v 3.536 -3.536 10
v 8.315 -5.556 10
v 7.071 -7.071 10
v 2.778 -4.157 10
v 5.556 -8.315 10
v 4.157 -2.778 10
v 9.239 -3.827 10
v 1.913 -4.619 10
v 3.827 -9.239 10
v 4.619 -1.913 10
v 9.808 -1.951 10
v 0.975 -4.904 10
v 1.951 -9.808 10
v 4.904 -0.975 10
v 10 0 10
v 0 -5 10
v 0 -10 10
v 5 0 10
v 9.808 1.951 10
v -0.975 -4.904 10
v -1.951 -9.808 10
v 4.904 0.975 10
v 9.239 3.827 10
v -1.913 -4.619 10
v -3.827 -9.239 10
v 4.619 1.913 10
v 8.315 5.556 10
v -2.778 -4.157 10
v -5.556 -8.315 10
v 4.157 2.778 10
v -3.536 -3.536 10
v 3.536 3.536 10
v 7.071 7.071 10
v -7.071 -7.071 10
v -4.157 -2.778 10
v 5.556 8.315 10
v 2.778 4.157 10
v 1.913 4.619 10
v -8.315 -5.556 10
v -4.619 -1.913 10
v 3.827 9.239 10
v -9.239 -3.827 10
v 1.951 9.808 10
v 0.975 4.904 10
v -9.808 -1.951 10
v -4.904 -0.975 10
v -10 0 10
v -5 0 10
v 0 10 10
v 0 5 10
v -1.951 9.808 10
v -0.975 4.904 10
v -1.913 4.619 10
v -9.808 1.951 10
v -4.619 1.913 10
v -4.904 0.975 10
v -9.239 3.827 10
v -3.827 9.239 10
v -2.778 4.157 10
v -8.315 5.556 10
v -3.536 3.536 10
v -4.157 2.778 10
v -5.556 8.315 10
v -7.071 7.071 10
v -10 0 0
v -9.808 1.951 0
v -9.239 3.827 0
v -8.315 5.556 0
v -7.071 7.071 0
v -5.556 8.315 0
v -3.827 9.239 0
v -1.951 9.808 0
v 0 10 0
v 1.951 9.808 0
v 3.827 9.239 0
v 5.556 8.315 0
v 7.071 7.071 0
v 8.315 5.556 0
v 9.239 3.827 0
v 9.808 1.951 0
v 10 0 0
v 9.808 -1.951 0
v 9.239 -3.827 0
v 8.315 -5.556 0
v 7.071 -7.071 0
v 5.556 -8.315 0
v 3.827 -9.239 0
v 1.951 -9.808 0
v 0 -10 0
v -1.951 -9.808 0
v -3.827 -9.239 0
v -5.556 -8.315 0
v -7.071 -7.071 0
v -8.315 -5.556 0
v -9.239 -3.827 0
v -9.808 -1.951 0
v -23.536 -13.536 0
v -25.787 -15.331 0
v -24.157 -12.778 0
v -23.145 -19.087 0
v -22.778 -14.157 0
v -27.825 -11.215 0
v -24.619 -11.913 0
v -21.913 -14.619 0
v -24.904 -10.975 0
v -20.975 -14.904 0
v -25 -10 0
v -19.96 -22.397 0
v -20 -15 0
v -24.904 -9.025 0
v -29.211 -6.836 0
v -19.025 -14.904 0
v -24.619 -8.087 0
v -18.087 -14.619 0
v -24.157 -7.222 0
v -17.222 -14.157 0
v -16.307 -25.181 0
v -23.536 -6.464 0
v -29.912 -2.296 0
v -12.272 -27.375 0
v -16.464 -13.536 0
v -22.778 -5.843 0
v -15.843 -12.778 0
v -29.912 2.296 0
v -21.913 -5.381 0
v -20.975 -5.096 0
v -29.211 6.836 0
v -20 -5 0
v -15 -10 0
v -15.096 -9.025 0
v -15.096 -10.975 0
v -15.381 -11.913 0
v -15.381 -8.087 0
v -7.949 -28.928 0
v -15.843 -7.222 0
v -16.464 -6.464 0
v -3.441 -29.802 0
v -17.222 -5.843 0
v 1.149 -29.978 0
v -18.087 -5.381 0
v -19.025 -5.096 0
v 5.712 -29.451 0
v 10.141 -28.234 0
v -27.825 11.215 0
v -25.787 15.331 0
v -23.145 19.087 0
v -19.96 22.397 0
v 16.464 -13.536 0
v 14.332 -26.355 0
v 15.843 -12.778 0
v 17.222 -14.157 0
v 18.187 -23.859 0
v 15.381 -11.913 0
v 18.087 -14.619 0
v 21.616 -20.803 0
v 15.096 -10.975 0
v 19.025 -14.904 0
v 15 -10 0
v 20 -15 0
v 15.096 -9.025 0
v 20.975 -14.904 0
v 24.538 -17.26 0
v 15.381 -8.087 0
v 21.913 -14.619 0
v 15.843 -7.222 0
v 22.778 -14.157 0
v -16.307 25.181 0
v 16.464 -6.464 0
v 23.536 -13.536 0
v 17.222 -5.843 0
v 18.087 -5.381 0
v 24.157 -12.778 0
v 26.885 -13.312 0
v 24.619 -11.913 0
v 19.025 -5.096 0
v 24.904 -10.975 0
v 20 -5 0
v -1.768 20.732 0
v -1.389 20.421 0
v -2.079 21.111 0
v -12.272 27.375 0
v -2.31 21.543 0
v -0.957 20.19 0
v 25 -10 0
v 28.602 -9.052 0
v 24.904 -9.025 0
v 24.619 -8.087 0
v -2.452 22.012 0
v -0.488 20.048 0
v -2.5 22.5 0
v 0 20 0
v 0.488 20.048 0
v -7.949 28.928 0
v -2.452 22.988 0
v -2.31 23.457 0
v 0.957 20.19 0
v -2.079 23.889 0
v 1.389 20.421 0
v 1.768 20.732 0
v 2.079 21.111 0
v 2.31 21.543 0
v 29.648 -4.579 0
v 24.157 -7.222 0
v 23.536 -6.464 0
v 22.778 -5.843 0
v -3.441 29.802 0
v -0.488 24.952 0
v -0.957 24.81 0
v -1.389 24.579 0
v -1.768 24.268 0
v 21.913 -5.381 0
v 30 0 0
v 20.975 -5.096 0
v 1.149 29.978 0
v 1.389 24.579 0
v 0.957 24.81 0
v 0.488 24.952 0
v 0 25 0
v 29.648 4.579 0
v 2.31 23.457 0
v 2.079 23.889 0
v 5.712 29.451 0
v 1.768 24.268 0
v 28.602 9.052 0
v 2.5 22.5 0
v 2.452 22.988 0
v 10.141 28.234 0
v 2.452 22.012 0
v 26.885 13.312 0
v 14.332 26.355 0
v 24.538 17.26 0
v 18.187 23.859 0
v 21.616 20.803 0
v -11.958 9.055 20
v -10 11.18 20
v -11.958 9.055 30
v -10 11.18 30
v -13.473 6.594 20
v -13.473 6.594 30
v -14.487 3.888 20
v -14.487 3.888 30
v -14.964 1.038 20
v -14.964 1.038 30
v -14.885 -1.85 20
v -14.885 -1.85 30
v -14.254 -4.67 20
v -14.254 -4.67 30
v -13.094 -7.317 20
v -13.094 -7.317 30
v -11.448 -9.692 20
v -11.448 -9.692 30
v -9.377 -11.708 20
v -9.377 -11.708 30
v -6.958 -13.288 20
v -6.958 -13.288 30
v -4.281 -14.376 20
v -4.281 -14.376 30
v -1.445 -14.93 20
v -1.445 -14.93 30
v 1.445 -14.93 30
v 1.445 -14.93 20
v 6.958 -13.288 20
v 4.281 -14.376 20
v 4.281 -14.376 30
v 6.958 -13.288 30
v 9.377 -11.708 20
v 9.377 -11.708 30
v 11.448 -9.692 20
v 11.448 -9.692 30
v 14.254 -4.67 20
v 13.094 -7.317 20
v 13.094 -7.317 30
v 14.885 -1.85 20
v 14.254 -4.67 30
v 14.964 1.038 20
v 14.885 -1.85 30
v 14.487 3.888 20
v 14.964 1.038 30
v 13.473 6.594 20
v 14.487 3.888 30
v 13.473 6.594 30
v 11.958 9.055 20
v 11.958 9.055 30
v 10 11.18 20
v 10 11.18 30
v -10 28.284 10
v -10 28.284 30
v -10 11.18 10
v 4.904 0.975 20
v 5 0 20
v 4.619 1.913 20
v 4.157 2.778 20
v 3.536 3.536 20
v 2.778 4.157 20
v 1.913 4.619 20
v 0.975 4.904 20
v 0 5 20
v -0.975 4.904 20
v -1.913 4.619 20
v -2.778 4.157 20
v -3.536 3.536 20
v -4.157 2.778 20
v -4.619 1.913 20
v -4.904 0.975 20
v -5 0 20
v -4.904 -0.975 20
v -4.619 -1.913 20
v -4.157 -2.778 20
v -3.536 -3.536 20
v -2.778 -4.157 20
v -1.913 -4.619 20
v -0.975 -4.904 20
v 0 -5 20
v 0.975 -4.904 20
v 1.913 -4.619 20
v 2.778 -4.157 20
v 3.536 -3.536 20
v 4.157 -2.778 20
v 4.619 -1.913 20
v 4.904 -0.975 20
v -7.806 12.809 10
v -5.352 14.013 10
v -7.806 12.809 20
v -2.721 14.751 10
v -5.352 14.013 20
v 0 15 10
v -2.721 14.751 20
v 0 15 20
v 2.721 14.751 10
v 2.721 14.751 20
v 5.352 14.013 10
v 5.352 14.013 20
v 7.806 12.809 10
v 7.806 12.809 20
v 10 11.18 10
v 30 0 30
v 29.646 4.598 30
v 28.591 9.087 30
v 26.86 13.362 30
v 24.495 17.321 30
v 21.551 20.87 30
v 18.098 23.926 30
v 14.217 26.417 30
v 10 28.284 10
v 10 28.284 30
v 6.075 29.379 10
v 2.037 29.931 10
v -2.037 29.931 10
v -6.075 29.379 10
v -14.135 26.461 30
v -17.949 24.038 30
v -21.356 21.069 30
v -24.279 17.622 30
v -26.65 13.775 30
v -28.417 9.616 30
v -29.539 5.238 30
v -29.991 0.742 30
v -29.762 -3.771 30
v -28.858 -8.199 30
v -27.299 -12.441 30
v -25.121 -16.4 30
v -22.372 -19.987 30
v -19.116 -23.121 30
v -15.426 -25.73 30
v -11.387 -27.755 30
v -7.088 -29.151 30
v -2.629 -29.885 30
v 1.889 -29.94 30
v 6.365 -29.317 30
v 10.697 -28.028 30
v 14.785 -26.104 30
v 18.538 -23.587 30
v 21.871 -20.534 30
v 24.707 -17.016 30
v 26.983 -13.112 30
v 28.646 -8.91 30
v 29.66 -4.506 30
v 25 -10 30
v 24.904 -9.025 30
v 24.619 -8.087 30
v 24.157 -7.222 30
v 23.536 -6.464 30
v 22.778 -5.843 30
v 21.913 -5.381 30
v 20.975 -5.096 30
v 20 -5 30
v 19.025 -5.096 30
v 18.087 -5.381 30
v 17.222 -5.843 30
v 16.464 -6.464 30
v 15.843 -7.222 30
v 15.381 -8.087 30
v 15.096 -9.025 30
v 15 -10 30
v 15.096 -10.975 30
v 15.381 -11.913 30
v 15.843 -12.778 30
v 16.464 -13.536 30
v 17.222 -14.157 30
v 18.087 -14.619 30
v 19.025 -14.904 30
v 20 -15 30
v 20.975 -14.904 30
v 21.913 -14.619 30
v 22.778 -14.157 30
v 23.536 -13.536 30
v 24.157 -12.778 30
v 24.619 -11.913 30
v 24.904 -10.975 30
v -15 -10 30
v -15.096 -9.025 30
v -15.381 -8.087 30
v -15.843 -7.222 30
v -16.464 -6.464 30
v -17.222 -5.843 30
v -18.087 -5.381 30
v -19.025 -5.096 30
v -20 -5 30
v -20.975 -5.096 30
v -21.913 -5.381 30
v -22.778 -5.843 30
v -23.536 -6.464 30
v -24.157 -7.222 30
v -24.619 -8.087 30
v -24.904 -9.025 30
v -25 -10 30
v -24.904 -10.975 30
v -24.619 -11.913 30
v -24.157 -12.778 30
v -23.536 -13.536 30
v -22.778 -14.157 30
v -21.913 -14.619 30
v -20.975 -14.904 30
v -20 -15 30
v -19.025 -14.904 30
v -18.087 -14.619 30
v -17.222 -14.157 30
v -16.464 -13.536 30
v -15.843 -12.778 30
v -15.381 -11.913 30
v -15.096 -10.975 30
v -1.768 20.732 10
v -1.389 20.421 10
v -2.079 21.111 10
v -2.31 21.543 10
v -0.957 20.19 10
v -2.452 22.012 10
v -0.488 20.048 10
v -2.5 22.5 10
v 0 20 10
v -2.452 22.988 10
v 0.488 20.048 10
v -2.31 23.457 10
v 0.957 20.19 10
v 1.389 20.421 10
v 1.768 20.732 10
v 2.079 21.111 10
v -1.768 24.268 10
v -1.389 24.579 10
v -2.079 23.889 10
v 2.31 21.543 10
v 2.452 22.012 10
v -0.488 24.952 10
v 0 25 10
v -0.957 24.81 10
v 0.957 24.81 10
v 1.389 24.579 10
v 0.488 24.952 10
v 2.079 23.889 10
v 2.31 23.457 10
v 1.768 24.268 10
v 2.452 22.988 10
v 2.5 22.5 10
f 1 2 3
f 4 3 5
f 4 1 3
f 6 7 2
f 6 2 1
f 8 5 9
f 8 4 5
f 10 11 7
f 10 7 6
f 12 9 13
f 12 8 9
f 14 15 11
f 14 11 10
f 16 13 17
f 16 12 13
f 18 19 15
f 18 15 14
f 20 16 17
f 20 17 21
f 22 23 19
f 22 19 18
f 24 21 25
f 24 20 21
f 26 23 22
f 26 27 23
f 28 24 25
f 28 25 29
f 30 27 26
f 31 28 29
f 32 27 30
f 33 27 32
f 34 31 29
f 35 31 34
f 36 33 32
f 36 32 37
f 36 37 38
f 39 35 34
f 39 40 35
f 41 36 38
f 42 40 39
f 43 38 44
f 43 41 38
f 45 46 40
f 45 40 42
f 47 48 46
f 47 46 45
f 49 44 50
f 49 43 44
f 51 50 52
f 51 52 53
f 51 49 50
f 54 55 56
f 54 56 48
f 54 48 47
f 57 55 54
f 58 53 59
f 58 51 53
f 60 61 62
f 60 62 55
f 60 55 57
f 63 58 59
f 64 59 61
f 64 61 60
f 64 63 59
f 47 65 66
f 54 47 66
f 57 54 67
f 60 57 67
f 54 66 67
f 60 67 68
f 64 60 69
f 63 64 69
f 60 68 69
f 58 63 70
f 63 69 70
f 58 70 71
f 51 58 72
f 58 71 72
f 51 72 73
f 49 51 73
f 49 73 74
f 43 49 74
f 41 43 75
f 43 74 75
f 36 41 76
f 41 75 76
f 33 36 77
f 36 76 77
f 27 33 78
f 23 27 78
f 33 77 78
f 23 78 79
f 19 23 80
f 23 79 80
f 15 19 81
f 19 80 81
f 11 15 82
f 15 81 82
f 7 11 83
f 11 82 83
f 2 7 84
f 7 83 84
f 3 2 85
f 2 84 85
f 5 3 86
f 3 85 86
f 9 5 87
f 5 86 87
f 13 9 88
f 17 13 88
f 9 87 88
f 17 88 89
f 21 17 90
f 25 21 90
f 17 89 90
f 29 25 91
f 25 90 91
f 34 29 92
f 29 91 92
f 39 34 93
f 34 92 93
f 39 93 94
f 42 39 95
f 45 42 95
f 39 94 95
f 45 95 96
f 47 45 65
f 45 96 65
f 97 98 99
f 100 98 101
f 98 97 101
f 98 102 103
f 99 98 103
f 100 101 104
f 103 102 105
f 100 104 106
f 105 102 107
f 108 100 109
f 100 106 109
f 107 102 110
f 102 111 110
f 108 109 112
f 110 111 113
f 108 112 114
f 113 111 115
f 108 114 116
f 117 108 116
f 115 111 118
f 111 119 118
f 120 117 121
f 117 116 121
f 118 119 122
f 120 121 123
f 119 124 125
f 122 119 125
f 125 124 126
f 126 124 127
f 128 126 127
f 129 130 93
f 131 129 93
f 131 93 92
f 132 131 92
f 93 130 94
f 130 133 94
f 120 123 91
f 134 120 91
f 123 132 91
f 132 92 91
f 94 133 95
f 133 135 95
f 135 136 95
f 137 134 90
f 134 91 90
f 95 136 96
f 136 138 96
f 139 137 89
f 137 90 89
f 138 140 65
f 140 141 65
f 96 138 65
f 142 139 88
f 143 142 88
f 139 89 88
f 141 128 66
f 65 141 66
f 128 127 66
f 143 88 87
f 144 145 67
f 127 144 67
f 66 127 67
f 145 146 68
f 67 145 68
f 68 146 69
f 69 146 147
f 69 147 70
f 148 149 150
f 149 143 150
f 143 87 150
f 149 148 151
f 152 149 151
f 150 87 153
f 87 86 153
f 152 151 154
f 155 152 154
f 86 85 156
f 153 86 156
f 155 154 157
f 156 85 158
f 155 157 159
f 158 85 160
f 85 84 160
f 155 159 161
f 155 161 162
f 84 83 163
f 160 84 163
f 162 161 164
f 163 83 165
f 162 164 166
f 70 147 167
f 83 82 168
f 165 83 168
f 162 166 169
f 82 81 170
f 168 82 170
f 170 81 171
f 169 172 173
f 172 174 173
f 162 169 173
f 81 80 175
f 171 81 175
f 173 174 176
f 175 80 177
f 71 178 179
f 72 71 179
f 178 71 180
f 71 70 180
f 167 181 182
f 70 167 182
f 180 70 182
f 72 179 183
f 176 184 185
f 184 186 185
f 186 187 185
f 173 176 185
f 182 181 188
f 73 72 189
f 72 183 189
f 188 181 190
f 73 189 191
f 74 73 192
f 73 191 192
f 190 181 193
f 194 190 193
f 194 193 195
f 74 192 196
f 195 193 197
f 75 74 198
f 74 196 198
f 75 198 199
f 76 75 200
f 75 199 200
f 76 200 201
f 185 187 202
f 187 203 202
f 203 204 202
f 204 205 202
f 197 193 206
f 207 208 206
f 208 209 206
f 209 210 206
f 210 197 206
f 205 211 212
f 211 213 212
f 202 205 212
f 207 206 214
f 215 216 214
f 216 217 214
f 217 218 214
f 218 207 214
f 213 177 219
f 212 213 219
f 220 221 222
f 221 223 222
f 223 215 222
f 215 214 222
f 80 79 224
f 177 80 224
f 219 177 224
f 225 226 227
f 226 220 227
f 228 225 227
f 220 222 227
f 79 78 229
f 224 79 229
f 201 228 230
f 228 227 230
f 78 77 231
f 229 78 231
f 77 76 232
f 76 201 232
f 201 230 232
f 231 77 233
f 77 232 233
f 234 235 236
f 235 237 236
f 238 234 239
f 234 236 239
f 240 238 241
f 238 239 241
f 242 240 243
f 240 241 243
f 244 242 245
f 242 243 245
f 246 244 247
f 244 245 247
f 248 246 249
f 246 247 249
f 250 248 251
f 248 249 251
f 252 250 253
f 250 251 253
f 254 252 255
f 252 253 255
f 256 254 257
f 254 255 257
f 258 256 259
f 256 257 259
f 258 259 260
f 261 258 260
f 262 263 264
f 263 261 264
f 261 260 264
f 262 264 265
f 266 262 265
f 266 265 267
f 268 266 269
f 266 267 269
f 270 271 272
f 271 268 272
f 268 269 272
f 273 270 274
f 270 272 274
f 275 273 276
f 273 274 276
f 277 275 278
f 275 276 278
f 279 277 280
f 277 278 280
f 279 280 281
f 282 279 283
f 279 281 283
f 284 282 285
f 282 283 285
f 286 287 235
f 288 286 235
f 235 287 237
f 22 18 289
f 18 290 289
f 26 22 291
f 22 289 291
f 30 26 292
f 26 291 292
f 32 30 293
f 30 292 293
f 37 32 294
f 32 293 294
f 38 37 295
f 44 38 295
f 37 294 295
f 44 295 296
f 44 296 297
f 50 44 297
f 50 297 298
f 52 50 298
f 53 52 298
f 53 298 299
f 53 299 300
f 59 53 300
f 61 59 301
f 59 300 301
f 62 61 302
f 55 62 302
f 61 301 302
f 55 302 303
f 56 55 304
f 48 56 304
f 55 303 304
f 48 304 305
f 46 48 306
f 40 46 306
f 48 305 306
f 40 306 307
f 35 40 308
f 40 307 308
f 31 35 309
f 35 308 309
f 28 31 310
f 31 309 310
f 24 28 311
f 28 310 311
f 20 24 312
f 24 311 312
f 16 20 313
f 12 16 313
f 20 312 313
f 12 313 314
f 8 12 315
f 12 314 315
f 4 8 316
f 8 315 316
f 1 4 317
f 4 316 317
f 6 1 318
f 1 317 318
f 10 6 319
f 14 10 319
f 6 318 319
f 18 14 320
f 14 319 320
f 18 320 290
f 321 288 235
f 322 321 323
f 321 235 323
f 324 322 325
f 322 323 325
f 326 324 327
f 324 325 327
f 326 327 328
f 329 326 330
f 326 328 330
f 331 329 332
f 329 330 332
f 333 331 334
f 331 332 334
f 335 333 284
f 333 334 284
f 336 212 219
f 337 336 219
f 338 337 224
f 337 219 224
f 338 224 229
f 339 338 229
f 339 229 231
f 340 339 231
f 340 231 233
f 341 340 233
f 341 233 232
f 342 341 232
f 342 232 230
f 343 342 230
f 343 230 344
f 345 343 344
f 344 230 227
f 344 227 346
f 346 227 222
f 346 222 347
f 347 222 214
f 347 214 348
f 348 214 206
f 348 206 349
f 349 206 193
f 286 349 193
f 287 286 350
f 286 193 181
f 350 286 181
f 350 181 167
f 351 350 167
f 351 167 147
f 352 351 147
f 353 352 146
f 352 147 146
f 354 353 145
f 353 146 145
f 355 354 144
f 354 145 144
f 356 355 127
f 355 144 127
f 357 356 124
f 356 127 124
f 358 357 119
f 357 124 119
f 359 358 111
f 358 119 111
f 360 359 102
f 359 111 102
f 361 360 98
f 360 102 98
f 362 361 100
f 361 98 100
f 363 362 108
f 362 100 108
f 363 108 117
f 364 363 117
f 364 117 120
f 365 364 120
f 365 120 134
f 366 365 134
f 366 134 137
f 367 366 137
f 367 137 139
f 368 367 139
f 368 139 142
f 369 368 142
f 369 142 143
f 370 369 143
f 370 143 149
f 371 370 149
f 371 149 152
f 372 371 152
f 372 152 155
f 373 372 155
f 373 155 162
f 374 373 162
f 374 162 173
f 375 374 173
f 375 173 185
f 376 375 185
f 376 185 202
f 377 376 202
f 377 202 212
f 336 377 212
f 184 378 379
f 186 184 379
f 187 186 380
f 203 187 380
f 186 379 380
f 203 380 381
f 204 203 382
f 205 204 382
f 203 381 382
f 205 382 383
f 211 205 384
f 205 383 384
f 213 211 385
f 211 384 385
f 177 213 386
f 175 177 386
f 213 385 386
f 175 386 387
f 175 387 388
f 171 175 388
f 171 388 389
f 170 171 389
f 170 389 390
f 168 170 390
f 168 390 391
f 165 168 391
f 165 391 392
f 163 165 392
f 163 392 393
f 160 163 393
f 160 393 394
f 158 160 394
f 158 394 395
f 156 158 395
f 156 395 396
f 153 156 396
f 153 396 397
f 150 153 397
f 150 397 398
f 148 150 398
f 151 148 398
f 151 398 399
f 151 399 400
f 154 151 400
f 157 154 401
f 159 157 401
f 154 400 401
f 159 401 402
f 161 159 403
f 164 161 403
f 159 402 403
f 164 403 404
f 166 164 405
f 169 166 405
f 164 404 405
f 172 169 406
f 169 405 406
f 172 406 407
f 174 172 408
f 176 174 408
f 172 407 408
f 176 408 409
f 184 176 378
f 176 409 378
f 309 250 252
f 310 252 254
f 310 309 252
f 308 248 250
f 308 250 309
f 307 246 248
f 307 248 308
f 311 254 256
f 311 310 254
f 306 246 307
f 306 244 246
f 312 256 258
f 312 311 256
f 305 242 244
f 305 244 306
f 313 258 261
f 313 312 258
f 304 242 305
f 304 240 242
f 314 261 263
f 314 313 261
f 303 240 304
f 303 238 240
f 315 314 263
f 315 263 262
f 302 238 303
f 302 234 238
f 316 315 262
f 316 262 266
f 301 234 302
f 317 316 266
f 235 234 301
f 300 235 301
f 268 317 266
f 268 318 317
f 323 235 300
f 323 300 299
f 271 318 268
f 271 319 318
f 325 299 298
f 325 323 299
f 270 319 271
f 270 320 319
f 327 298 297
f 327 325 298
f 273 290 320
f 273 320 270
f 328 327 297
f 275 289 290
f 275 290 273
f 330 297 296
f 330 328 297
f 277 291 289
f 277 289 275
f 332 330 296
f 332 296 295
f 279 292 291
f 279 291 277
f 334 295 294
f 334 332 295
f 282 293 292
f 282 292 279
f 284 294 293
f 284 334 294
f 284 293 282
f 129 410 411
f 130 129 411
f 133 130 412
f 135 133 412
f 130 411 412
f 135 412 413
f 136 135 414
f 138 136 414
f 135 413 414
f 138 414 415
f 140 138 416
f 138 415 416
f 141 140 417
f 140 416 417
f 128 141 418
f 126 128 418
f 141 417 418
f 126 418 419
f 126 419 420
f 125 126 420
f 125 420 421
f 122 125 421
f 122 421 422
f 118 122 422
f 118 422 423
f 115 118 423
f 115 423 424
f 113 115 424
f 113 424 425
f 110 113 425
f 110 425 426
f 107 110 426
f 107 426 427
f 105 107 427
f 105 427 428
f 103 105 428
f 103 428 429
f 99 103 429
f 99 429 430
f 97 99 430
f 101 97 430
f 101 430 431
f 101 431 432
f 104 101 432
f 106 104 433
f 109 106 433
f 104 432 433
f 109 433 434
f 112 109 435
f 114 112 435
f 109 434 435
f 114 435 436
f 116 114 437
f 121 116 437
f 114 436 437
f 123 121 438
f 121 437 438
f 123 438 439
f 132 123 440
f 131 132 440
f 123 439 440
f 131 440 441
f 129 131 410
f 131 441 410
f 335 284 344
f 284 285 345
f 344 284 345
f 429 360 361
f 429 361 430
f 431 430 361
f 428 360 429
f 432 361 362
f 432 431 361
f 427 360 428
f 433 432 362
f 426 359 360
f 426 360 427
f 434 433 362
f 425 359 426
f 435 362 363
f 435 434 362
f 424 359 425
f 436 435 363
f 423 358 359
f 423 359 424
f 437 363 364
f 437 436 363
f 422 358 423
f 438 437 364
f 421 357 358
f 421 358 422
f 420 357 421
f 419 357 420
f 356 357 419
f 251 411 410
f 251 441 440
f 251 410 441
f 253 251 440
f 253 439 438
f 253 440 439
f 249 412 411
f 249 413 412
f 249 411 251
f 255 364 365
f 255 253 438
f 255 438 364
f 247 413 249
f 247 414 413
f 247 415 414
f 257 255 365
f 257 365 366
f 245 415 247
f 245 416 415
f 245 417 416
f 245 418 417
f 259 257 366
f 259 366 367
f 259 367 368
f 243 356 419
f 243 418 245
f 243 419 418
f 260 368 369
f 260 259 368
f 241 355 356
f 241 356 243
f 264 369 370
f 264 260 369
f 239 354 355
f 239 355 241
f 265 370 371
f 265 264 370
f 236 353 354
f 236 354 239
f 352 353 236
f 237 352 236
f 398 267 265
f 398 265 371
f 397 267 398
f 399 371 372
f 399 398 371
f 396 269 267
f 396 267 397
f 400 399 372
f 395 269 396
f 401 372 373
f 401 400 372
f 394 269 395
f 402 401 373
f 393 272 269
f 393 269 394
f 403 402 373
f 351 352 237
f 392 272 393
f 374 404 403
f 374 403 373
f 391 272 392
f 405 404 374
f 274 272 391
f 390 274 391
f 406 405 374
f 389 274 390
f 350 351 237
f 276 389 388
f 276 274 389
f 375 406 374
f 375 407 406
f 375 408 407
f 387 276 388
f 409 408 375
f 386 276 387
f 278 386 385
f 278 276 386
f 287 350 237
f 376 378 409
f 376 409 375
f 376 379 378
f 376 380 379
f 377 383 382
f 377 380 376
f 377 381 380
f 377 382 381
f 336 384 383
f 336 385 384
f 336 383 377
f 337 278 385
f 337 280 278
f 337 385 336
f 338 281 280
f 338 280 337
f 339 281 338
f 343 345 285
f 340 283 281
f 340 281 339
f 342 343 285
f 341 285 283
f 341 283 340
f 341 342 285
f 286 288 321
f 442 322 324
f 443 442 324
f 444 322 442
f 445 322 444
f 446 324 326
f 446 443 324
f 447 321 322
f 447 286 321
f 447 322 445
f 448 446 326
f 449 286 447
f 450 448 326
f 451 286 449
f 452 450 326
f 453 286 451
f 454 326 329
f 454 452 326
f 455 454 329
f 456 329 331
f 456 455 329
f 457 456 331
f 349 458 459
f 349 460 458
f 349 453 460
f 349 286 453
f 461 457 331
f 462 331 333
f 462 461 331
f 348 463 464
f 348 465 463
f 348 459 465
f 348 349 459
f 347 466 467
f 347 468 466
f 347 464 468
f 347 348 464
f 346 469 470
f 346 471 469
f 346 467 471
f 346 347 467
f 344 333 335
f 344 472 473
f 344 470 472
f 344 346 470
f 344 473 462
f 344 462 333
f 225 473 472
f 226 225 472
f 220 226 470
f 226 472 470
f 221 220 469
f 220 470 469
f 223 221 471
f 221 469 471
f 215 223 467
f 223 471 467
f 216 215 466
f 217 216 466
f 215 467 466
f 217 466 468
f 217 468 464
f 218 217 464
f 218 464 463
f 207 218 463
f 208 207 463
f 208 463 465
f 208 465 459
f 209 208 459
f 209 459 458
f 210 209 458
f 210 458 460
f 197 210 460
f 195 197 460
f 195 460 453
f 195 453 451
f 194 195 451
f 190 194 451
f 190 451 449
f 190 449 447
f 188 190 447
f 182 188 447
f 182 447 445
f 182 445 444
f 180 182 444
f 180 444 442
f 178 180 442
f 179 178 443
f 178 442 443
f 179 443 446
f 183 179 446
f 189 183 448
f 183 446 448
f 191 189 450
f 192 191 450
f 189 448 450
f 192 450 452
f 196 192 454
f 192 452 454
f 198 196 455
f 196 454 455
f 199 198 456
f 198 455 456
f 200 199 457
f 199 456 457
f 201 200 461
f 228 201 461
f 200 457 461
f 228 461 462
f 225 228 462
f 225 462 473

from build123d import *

# Parameters (mm, degrees)
SKETCH1_R           = 30
BOSS_EXTRUDE1_DEPTH = 30
SKETCH2_R           = 15
CUT_EXTRUDE1_DEPTH  = 10
SKETCH3_R           = 5
CUT_EXTRUDE2_DEPTH  = 10
SKETCH5_R           = 5
CUT_EXTRUDE5_DEPTH  = 110
CUT_EXTRUDE6_DEPTH  = 20
SKETCH7_R           = 2.5
CUT_EXTRUDE7_DEPTH  = 20
SKETCH8_R           = 5
CUT_EXTRUDE8_DEPTH  = 10
SKETCH9_R           = 10
CUT_EXTRUDE9_DEPTH  = 10


with BuildPart() as part:
    # Sketch1 → Boss-Extrude1 (new body)
    with BuildSketch(Plane.XY):
        Circle(SKETCH1_R)
    extrude(amount=BOSS_EXTRUDE1_DEPTH)

    # Sketch2 → Cut-Extrude1 (cut)
    with BuildSketch(Plane.XY.offset(30)):
        Circle(SKETCH2_R)
    extrude(amount=-CUT_EXTRUDE1_DEPTH, mode=Mode.SUBTRACT)

    # Sketch3 → Cut-Extrude2 (cut)
    with BuildSketch(Plane.XY.offset(20)):
        Circle(SKETCH3_R)
    extrude(amount=-CUT_EXTRUDE2_DEPTH, mode=Mode.SUBTRACT)

    # Sketch5 → Cut-Extrude5 (cut)
    with BuildSketch(Plane.XY.offset(30)):
        with Locations((20, -10)):
            Circle(SKETCH5_R)
        with Locations((-20, -10)):
            Circle(SKETCH5_R)
    extrude(amount=-CUT_EXTRUDE5_DEPTH, mode=Mode.SUBTRACT)

    # Sketch6 → Cut-Extrude6 (cut)
    with BuildSketch(Plane.XY.offset(30)):
        with BuildLine():
            Line((-10, 28.284271247), (-10, 11.180339887))
            ThreePointArc((-10, 11.180339887), (0, 15), (10, 11.180339887))
            Line((10, 11.180339887), (10, 28.284271247))
            ThreePointArc((10, 28.284271247), (0, 30), (-10, 28.284271247))
        make_face()
    extrude(amount=-CUT_EXTRUDE6_DEPTH, mode=Mode.SUBTRACT)

    # Sketch7 → Cut-Extrude7 (cut)
    with BuildSketch(Plane.XY.offset(10)):
        with Locations((0, 22.5)):
            Circle(SKETCH7_R)
    extrude(amount=-CUT_EXTRUDE7_DEPTH, mode=Mode.SUBTRACT)

    # Sketch8 → Cut-Extrude8 (cut)
    with BuildSketch(Plane.XY.offset(10)):
        Circle(SKETCH8_R)
    extrude(amount=-CUT_EXTRUDE8_DEPTH, mode=Mode.SUBTRACT)

    # Sketch9 → Cut-Extrude9 (cut)
    with BuildSketch(Plane(origin=(0, 0, 0), x_dir=(-1, 0, 0), z_dir=(0, 0, -1))):
        Circle(SKETCH9_R)
    extrude(amount=-CUT_EXTRUDE9_DEPTH, mode=Mode.SUBTRACT)


solid = part.part
